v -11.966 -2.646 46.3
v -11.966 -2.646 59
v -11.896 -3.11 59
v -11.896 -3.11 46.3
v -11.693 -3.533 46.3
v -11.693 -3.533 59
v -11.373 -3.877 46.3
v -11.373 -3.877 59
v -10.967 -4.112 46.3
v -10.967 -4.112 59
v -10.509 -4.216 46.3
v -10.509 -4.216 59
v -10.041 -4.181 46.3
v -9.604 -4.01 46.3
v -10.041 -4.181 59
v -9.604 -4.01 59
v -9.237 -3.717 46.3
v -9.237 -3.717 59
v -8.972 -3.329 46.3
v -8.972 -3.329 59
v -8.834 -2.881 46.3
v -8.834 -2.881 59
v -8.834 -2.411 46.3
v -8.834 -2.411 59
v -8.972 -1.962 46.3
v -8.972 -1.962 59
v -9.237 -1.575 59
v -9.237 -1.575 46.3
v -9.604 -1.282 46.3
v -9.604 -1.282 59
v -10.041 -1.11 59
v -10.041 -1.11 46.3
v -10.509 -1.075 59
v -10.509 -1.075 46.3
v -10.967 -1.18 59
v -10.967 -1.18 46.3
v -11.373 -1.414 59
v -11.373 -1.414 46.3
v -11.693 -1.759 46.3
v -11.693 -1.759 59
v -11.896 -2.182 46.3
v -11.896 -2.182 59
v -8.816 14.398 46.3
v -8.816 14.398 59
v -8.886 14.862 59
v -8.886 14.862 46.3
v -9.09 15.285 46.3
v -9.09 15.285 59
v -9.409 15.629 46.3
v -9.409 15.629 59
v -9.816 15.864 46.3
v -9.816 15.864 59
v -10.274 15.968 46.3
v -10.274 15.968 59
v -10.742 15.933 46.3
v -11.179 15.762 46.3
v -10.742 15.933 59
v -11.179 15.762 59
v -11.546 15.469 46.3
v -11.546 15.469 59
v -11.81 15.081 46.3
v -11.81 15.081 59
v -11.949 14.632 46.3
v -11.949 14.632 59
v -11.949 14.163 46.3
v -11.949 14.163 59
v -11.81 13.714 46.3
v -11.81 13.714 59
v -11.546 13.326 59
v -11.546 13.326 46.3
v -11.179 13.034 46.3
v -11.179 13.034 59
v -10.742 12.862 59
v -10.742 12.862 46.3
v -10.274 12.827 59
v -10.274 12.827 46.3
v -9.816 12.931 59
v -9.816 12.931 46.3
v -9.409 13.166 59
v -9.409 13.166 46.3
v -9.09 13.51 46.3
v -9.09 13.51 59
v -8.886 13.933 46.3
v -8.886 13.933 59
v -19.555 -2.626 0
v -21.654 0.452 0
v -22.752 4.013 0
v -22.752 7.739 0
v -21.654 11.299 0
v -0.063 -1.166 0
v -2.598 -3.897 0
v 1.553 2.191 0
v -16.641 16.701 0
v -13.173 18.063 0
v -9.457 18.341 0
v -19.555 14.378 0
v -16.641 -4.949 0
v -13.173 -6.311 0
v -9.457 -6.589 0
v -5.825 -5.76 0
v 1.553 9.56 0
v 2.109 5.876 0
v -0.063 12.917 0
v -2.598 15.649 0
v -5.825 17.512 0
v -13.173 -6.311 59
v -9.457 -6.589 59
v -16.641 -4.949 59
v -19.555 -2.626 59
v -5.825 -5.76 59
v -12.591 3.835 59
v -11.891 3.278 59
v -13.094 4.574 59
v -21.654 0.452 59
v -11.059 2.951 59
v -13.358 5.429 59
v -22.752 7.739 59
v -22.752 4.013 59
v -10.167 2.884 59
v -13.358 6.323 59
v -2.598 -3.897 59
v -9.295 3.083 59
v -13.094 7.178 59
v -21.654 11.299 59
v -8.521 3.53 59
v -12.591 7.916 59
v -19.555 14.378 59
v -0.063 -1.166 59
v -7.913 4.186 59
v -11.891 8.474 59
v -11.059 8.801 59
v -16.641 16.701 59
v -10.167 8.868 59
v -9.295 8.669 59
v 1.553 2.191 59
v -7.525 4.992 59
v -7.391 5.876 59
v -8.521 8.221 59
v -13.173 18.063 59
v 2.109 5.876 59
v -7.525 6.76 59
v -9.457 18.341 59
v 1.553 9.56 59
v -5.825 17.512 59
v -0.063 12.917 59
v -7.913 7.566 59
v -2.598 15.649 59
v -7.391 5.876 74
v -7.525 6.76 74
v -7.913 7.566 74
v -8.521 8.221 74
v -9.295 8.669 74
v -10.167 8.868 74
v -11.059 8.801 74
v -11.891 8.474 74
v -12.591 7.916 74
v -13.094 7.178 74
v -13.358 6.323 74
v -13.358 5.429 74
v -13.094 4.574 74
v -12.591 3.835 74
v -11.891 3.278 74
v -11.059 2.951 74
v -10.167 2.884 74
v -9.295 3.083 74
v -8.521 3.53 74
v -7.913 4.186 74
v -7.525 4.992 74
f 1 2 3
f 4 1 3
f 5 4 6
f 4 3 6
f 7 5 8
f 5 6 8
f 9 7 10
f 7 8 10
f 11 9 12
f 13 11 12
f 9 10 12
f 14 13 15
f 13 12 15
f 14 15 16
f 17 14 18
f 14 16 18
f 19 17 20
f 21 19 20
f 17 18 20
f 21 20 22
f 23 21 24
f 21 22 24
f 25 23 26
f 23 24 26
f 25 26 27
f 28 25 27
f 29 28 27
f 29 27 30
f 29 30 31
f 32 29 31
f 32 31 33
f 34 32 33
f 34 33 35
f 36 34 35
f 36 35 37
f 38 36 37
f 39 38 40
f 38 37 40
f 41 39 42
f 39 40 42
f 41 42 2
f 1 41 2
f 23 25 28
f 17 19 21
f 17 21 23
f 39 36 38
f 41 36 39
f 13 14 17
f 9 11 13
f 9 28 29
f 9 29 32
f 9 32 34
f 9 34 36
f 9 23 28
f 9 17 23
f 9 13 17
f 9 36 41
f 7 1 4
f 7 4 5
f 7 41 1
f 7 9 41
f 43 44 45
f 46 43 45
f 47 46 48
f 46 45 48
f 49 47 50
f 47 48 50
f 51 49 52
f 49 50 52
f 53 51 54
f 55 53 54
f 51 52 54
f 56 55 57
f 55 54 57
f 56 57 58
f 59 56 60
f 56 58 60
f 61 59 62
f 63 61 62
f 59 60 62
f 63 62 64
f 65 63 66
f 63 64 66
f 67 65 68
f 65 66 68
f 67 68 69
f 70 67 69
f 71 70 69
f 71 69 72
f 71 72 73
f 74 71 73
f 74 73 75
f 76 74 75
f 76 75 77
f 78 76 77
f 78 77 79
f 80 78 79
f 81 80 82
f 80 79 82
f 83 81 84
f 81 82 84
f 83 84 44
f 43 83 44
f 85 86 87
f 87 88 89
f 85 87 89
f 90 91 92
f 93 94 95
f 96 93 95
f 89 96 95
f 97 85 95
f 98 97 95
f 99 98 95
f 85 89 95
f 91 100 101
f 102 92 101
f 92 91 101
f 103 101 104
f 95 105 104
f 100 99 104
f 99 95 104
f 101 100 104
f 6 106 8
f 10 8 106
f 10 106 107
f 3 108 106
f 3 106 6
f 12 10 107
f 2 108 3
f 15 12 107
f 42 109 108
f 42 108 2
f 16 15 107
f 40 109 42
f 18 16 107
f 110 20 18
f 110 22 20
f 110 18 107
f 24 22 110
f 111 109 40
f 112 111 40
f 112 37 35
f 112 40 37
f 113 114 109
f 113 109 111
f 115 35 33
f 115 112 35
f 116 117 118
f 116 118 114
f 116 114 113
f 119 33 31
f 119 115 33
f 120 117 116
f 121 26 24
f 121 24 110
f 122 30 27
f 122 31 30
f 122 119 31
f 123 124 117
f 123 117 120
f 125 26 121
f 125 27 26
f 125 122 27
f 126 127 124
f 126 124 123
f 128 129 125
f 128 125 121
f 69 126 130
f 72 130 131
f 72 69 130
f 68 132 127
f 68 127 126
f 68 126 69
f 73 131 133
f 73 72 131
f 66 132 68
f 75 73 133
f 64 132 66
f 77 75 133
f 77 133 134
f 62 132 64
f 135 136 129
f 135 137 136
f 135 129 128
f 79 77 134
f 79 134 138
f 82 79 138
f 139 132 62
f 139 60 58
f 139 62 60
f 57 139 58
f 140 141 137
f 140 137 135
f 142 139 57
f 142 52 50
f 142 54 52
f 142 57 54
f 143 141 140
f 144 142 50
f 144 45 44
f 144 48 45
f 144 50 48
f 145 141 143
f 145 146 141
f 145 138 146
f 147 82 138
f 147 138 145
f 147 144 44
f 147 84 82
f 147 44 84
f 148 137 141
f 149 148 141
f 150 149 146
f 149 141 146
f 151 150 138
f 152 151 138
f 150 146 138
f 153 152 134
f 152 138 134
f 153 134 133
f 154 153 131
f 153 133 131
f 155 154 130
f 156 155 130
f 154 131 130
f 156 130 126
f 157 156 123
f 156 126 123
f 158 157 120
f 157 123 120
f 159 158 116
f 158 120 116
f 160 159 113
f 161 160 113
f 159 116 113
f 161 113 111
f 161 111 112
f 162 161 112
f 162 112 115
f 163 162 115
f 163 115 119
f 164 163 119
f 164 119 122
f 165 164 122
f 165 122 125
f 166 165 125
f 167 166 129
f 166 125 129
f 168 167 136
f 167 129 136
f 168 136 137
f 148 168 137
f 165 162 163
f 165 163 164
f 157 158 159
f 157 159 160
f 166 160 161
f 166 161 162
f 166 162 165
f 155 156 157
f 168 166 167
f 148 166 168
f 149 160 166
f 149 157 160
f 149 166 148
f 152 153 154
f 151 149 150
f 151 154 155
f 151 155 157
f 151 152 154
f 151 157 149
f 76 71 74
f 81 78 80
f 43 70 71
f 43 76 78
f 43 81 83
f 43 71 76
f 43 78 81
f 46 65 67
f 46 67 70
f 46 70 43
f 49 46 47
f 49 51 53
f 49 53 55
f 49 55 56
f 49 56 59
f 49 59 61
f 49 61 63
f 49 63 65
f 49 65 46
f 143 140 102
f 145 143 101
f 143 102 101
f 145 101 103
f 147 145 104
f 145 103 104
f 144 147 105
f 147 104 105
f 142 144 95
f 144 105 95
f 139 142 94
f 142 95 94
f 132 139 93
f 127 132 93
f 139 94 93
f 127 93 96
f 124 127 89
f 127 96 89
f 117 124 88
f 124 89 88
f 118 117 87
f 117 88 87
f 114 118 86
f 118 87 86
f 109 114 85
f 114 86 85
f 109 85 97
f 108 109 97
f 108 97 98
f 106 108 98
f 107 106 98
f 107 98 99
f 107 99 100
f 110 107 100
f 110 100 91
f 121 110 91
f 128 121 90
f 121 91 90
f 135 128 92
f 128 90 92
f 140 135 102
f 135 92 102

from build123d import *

# Parameters (mm, degrees)
SKETCH1_R           = 12.5
BOSS_EXTRUDE1_DEPTH = 59
SKETCH2_R           = 1.575
CUT_EXTRUDE1_DEPTH  = 12.7
SKETCH3_R           = 3
BOSS_EXTRUDE2_DEPTH = 15


with BuildPart() as part:
    # Sketch1 → Boss-Extrude1 (new body)
    with BuildSketch(Plane.XY):
        with Locations((-10.391437804, 5.875911401)):
            Circle(SKETCH1_R)
    extrude(amount=BOSS_EXTRUDE1_DEPTH)

    # Sketch2 → Cut-Extrude1 (cut)
    with BuildSketch(Plane.XY.offset(59)):
        with Locations((-10.391437804, 14.397611401)):
            Circle(SKETCH2_R)
        with Locations(Location((-10.391437804, -2.645788599, 0), (0, 0, 180))):
            Circle(SKETCH2_R)
    extrude(amount=-CUT_EXTRUDE1_DEPTH, mode=Mode.SUBTRACT)

    # Sketch3 → Boss-Extrude2 (add)
    with BuildSketch(Plane.XY.offset(59)):
        with Locations((-10.391437804, 5.875911401)):
            Circle(SKETCH3_R)
    extrude(amount=BOSS_EXTRUDE2_DEPTH)


solid = part.part
